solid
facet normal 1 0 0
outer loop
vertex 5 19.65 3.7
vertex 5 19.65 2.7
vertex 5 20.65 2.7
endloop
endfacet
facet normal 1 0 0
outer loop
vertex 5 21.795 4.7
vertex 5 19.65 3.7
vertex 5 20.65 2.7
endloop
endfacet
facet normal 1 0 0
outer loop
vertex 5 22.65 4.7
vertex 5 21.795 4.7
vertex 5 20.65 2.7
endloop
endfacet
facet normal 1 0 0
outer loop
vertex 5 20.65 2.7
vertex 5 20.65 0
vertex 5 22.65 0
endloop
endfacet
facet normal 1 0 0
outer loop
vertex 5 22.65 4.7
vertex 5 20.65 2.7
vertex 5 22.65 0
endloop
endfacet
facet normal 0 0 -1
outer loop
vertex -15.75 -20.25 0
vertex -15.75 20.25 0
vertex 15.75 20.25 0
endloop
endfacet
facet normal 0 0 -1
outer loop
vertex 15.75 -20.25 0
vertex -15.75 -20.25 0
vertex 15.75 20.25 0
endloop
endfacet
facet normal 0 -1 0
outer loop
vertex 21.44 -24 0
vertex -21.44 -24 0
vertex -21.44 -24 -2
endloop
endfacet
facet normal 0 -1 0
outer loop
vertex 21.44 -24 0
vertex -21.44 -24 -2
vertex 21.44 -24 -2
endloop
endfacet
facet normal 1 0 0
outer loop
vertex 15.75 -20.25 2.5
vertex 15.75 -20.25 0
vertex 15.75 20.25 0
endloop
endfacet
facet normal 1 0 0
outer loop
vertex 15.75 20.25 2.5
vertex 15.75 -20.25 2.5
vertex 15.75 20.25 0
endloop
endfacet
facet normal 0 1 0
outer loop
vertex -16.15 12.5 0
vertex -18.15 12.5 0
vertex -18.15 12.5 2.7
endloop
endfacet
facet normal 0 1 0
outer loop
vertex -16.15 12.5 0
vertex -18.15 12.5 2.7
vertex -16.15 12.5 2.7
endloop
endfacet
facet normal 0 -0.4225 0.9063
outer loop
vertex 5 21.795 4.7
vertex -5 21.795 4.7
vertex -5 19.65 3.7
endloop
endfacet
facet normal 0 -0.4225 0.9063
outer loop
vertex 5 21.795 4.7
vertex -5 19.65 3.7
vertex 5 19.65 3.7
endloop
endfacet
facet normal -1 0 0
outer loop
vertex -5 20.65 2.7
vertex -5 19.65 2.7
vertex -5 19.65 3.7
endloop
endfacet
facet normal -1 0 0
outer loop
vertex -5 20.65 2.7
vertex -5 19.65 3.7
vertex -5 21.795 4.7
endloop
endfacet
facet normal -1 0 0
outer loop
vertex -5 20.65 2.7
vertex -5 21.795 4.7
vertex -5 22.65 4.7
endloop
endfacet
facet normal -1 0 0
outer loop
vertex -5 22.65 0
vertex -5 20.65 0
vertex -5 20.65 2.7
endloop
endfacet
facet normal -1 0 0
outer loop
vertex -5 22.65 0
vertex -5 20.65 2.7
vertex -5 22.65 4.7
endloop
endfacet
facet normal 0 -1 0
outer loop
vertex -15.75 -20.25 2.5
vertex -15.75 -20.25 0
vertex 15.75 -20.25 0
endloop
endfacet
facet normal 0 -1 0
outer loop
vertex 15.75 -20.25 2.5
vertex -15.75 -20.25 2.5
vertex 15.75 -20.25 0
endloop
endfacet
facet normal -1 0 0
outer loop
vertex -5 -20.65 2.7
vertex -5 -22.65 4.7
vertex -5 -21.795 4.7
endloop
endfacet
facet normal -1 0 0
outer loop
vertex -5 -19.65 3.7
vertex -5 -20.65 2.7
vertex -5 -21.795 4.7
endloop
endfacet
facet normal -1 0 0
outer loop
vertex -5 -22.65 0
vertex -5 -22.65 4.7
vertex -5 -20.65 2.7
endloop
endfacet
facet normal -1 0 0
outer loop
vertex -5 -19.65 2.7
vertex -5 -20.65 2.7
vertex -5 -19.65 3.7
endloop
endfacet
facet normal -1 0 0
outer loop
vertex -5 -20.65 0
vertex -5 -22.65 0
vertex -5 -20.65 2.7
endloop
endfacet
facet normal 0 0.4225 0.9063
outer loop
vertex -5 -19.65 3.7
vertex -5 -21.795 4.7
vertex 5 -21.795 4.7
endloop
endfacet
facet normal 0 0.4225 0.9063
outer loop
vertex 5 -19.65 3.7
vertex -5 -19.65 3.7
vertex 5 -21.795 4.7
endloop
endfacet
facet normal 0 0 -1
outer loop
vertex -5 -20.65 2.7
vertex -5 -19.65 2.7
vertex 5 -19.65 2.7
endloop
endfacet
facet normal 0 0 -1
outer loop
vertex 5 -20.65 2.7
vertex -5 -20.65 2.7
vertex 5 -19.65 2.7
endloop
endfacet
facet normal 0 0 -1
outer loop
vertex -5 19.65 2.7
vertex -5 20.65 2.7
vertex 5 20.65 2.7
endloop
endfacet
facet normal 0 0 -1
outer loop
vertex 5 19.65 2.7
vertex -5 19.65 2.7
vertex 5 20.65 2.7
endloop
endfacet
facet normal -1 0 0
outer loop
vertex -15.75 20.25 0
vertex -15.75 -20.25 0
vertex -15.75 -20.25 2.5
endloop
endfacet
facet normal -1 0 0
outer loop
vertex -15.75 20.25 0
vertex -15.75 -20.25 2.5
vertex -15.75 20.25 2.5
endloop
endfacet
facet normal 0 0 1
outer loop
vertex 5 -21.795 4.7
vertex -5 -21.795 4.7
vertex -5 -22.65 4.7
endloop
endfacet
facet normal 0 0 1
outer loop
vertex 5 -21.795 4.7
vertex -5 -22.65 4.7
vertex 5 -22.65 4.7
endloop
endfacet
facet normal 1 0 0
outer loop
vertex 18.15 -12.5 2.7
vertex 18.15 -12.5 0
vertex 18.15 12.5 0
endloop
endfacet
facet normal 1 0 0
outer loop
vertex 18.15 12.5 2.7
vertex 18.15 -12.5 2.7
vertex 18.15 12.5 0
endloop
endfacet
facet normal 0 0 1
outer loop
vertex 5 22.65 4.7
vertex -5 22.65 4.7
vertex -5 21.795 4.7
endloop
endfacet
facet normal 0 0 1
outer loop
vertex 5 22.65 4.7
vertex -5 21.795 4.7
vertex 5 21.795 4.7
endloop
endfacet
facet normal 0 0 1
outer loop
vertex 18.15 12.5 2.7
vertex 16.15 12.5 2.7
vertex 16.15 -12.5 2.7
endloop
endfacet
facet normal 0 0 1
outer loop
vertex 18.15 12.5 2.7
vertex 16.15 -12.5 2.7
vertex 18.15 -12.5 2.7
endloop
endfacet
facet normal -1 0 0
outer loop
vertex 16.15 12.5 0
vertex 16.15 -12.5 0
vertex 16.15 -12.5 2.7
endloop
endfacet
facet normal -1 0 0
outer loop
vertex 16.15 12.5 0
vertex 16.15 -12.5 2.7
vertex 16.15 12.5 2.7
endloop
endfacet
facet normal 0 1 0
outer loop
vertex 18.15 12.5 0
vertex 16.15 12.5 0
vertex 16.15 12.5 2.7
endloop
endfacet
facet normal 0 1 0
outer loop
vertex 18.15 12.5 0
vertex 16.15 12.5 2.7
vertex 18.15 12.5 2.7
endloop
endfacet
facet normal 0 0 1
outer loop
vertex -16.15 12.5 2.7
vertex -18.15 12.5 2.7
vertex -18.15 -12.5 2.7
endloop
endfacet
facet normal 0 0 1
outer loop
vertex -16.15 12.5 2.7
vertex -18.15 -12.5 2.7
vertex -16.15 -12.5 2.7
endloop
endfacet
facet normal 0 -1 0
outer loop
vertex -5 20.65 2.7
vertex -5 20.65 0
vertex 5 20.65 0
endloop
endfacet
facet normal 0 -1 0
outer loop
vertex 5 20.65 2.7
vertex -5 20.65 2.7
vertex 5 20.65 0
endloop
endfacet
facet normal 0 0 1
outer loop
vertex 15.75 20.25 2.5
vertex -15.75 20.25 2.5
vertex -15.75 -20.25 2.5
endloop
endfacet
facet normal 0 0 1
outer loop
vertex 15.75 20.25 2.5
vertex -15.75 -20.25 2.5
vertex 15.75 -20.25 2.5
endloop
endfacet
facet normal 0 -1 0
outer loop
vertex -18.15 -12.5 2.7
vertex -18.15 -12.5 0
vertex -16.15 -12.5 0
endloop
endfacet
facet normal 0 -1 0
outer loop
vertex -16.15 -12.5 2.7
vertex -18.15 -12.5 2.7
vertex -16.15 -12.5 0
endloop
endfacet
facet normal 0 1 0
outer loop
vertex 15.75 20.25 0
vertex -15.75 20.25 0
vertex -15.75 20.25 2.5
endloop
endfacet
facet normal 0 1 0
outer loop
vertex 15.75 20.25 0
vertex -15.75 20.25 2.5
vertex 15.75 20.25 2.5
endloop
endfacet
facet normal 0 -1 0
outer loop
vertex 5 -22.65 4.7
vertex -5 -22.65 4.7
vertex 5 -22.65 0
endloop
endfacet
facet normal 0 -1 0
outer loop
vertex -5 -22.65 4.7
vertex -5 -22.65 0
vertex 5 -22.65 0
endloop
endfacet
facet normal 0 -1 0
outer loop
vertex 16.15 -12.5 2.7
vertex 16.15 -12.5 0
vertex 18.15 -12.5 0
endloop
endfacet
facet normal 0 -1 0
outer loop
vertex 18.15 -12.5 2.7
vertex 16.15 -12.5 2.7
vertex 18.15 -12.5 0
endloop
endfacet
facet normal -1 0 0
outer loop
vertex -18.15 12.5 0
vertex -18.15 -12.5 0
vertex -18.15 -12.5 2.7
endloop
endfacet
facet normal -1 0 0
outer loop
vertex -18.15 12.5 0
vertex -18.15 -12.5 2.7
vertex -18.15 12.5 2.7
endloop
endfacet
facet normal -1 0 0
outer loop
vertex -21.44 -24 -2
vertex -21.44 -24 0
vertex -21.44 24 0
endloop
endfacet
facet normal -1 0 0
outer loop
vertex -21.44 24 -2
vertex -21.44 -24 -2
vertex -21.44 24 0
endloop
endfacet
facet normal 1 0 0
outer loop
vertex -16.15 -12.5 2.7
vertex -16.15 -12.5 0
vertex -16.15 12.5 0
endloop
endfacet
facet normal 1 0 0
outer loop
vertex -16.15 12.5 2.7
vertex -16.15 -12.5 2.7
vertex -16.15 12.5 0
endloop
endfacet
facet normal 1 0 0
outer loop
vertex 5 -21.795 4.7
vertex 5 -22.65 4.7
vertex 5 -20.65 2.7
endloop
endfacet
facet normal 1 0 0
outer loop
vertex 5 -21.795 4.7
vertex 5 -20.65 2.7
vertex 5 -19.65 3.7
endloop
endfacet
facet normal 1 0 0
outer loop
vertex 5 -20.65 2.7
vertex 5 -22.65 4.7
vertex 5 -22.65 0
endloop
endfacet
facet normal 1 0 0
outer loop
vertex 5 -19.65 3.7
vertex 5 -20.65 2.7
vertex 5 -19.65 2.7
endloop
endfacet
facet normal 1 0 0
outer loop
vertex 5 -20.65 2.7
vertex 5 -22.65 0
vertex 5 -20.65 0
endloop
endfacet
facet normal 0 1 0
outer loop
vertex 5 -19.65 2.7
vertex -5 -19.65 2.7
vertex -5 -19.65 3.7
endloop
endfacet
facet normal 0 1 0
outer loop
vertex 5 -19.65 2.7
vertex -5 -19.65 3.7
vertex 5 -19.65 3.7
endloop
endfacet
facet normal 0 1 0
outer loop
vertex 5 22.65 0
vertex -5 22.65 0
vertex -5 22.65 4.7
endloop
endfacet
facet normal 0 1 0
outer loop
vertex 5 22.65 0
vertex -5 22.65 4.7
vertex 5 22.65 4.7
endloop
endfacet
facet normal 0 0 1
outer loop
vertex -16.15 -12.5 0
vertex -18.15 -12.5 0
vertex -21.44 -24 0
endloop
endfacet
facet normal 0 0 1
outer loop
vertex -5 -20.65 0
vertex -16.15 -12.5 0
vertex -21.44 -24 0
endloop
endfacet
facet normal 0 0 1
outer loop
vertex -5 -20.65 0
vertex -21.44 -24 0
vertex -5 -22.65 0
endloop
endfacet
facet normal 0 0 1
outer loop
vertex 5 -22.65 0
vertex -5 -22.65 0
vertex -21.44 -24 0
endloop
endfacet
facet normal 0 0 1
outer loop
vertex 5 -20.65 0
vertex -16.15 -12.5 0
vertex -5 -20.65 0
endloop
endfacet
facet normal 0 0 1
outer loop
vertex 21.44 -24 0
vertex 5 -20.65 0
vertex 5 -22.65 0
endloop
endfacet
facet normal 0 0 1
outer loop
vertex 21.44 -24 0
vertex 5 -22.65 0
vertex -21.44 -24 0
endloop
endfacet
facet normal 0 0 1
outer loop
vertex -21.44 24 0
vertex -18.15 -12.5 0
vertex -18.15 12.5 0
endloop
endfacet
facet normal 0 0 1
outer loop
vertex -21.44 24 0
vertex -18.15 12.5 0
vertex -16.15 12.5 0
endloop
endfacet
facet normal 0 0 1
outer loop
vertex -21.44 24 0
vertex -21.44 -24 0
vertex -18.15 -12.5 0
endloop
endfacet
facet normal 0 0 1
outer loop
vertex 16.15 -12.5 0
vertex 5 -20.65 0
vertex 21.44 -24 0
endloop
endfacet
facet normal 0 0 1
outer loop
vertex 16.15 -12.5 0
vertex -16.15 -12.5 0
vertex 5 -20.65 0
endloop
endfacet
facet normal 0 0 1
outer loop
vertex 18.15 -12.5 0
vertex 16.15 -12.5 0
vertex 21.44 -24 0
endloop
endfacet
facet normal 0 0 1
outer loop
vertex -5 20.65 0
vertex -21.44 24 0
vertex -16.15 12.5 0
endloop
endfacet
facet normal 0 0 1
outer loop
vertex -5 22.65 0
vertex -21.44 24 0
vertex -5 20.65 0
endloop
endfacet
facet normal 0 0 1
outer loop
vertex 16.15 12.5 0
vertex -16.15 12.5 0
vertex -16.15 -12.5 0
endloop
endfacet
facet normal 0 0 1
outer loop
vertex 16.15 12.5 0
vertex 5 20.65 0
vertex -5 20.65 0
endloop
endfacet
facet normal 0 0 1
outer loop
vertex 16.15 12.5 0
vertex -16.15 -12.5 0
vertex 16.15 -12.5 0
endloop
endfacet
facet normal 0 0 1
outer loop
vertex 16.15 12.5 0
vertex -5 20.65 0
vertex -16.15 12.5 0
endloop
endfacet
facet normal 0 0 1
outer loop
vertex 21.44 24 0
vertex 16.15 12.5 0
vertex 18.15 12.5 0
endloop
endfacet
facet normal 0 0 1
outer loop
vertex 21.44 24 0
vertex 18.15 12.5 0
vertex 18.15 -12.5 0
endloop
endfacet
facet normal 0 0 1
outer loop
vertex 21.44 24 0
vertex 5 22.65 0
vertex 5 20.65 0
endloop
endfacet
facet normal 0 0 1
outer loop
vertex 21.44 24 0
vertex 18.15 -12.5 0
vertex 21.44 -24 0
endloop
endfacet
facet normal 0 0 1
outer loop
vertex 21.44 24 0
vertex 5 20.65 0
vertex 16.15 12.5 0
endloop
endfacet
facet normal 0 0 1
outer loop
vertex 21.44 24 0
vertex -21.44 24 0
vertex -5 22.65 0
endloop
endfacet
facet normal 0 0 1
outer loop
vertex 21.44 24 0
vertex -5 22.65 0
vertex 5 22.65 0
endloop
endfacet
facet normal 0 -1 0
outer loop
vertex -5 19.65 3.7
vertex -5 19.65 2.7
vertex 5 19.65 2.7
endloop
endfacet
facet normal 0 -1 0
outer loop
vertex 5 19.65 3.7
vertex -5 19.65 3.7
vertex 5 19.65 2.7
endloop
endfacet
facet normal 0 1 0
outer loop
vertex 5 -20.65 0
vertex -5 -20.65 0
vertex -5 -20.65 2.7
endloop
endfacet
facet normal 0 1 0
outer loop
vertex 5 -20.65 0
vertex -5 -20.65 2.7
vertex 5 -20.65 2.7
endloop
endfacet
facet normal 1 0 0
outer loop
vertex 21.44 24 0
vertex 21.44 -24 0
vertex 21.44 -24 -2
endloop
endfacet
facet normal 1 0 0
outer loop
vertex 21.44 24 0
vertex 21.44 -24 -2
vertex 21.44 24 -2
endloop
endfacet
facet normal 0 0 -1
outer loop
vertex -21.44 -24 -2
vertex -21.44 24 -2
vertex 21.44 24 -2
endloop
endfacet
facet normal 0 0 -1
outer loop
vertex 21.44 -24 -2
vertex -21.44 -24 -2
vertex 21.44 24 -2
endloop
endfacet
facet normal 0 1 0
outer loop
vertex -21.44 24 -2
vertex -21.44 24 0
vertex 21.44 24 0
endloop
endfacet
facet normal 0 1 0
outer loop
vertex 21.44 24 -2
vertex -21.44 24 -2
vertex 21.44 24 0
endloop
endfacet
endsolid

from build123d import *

# Parameters (mm, degrees)
F0_W     = 31.5
F0_H     = 40.5
F1_DEPTH = 2.5
F2_W     = 2
F2_H     = 25
F3_DEPTH = 2.7
F2_W_2   = 10
F2_H_2   = 2
F4_W     = 42.88
F4_H     = 48
F5_DEPTH = 2
F6_W     = 10
F6_H     = 3
F7_DEPTH = 2
F8_SIZE2 = 2.1445069205
F8_SIZE  = 1
F9_SIZE2 = 2.1445069205
F9_SIZE  = 1


with BuildPart() as f1:
    # F0 (on Top) → F1 (new body)
    with BuildSketch(Plane.XY):
        Rectangle(F0_W, F0_H)
    extrude(amount=F1_DEPTH)


with BuildPart() as f3:
    # F2 (on Top) → F3 (new body)
    with BuildSketch(Plane.XY):
        with Locations((17.15, 0)):
            Rectangle(F2_W, F2_H)
    extrude(amount=F3_DEPTH)



with BuildPart() as f3b:
    # F2 (on Top) → F3, piece 2 (new body)
    with BuildSketch(Plane.XY):
        with Locations((0, -21.65)):
            Rectangle(F2_W_2, F2_H_2)
    extrude(amount=F3_DEPTH)


with BuildPart() as f3c:
    # F2 (on Top) → F3, piece 3 (new body)
    with BuildSketch(Plane.XY):
        with Locations((-17.15, 0)):
            Rectangle(F2_W, F2_H)
    extrude(amount=F3_DEPTH)


with BuildPart() as f3d:
    # F2 (on Top) → F3, piece 4 (new body)
    with BuildSketch(Plane.XY):
        with Locations((0, 21.65)):
            Rectangle(F2_W_2, F2_H_2)
    extrude(amount=F3_DEPTH)


with BuildPart() as f3_1:
    add(f3.part)

    add(f3b.part)  # F5 merges F3b

    add(f3c.part)  # F5 merges F3c

    add(f3d.part)  # F5 merges F3d
    # F4 (on Top) → F5 (join)
    with BuildSketch(Plane.XY):
        Rectangle(F4_W, F4_H)
    extrude(amount=-F5_DEPTH)

    # F6 (on face) → F7 (join)
    with BuildSketch(Plane.XY.offset(2.7)):
        with Locations((0, -21.15)):
            Rectangle(F6_W, F6_H)
        with Locations((0, 21.15)):
            Rectangle(F6_W, F6_H)
    extrude(amount=F7_DEPTH)

    # F8
    f8_edges = [f3_1.edges().sort_by_distance(p)[0] for p in [
        (0, 19.65, 4.7),
    ]]
    f8_side = f3_1.faces().sort_by_distance((0, 19.65, 3.7))[0]
    chamfer(f8_edges, length=F8_SIZE, length2=F8_SIZE2, reference=f8_side)

    # F9
    f9_edges = [f3_1.edges().sort_by_distance(p)[0] for p in [
        (0, -19.65, 4.7),
    ]]
    f9_side = f3_1.faces().sort_by_distance((0, -19.65, 3.7))[0]
    chamfer(f9_edges, length=F9_SIZE, length2=F9_SIZE2, reference=f9_side)


solid = Compound([f1.part, f3_1.part])
